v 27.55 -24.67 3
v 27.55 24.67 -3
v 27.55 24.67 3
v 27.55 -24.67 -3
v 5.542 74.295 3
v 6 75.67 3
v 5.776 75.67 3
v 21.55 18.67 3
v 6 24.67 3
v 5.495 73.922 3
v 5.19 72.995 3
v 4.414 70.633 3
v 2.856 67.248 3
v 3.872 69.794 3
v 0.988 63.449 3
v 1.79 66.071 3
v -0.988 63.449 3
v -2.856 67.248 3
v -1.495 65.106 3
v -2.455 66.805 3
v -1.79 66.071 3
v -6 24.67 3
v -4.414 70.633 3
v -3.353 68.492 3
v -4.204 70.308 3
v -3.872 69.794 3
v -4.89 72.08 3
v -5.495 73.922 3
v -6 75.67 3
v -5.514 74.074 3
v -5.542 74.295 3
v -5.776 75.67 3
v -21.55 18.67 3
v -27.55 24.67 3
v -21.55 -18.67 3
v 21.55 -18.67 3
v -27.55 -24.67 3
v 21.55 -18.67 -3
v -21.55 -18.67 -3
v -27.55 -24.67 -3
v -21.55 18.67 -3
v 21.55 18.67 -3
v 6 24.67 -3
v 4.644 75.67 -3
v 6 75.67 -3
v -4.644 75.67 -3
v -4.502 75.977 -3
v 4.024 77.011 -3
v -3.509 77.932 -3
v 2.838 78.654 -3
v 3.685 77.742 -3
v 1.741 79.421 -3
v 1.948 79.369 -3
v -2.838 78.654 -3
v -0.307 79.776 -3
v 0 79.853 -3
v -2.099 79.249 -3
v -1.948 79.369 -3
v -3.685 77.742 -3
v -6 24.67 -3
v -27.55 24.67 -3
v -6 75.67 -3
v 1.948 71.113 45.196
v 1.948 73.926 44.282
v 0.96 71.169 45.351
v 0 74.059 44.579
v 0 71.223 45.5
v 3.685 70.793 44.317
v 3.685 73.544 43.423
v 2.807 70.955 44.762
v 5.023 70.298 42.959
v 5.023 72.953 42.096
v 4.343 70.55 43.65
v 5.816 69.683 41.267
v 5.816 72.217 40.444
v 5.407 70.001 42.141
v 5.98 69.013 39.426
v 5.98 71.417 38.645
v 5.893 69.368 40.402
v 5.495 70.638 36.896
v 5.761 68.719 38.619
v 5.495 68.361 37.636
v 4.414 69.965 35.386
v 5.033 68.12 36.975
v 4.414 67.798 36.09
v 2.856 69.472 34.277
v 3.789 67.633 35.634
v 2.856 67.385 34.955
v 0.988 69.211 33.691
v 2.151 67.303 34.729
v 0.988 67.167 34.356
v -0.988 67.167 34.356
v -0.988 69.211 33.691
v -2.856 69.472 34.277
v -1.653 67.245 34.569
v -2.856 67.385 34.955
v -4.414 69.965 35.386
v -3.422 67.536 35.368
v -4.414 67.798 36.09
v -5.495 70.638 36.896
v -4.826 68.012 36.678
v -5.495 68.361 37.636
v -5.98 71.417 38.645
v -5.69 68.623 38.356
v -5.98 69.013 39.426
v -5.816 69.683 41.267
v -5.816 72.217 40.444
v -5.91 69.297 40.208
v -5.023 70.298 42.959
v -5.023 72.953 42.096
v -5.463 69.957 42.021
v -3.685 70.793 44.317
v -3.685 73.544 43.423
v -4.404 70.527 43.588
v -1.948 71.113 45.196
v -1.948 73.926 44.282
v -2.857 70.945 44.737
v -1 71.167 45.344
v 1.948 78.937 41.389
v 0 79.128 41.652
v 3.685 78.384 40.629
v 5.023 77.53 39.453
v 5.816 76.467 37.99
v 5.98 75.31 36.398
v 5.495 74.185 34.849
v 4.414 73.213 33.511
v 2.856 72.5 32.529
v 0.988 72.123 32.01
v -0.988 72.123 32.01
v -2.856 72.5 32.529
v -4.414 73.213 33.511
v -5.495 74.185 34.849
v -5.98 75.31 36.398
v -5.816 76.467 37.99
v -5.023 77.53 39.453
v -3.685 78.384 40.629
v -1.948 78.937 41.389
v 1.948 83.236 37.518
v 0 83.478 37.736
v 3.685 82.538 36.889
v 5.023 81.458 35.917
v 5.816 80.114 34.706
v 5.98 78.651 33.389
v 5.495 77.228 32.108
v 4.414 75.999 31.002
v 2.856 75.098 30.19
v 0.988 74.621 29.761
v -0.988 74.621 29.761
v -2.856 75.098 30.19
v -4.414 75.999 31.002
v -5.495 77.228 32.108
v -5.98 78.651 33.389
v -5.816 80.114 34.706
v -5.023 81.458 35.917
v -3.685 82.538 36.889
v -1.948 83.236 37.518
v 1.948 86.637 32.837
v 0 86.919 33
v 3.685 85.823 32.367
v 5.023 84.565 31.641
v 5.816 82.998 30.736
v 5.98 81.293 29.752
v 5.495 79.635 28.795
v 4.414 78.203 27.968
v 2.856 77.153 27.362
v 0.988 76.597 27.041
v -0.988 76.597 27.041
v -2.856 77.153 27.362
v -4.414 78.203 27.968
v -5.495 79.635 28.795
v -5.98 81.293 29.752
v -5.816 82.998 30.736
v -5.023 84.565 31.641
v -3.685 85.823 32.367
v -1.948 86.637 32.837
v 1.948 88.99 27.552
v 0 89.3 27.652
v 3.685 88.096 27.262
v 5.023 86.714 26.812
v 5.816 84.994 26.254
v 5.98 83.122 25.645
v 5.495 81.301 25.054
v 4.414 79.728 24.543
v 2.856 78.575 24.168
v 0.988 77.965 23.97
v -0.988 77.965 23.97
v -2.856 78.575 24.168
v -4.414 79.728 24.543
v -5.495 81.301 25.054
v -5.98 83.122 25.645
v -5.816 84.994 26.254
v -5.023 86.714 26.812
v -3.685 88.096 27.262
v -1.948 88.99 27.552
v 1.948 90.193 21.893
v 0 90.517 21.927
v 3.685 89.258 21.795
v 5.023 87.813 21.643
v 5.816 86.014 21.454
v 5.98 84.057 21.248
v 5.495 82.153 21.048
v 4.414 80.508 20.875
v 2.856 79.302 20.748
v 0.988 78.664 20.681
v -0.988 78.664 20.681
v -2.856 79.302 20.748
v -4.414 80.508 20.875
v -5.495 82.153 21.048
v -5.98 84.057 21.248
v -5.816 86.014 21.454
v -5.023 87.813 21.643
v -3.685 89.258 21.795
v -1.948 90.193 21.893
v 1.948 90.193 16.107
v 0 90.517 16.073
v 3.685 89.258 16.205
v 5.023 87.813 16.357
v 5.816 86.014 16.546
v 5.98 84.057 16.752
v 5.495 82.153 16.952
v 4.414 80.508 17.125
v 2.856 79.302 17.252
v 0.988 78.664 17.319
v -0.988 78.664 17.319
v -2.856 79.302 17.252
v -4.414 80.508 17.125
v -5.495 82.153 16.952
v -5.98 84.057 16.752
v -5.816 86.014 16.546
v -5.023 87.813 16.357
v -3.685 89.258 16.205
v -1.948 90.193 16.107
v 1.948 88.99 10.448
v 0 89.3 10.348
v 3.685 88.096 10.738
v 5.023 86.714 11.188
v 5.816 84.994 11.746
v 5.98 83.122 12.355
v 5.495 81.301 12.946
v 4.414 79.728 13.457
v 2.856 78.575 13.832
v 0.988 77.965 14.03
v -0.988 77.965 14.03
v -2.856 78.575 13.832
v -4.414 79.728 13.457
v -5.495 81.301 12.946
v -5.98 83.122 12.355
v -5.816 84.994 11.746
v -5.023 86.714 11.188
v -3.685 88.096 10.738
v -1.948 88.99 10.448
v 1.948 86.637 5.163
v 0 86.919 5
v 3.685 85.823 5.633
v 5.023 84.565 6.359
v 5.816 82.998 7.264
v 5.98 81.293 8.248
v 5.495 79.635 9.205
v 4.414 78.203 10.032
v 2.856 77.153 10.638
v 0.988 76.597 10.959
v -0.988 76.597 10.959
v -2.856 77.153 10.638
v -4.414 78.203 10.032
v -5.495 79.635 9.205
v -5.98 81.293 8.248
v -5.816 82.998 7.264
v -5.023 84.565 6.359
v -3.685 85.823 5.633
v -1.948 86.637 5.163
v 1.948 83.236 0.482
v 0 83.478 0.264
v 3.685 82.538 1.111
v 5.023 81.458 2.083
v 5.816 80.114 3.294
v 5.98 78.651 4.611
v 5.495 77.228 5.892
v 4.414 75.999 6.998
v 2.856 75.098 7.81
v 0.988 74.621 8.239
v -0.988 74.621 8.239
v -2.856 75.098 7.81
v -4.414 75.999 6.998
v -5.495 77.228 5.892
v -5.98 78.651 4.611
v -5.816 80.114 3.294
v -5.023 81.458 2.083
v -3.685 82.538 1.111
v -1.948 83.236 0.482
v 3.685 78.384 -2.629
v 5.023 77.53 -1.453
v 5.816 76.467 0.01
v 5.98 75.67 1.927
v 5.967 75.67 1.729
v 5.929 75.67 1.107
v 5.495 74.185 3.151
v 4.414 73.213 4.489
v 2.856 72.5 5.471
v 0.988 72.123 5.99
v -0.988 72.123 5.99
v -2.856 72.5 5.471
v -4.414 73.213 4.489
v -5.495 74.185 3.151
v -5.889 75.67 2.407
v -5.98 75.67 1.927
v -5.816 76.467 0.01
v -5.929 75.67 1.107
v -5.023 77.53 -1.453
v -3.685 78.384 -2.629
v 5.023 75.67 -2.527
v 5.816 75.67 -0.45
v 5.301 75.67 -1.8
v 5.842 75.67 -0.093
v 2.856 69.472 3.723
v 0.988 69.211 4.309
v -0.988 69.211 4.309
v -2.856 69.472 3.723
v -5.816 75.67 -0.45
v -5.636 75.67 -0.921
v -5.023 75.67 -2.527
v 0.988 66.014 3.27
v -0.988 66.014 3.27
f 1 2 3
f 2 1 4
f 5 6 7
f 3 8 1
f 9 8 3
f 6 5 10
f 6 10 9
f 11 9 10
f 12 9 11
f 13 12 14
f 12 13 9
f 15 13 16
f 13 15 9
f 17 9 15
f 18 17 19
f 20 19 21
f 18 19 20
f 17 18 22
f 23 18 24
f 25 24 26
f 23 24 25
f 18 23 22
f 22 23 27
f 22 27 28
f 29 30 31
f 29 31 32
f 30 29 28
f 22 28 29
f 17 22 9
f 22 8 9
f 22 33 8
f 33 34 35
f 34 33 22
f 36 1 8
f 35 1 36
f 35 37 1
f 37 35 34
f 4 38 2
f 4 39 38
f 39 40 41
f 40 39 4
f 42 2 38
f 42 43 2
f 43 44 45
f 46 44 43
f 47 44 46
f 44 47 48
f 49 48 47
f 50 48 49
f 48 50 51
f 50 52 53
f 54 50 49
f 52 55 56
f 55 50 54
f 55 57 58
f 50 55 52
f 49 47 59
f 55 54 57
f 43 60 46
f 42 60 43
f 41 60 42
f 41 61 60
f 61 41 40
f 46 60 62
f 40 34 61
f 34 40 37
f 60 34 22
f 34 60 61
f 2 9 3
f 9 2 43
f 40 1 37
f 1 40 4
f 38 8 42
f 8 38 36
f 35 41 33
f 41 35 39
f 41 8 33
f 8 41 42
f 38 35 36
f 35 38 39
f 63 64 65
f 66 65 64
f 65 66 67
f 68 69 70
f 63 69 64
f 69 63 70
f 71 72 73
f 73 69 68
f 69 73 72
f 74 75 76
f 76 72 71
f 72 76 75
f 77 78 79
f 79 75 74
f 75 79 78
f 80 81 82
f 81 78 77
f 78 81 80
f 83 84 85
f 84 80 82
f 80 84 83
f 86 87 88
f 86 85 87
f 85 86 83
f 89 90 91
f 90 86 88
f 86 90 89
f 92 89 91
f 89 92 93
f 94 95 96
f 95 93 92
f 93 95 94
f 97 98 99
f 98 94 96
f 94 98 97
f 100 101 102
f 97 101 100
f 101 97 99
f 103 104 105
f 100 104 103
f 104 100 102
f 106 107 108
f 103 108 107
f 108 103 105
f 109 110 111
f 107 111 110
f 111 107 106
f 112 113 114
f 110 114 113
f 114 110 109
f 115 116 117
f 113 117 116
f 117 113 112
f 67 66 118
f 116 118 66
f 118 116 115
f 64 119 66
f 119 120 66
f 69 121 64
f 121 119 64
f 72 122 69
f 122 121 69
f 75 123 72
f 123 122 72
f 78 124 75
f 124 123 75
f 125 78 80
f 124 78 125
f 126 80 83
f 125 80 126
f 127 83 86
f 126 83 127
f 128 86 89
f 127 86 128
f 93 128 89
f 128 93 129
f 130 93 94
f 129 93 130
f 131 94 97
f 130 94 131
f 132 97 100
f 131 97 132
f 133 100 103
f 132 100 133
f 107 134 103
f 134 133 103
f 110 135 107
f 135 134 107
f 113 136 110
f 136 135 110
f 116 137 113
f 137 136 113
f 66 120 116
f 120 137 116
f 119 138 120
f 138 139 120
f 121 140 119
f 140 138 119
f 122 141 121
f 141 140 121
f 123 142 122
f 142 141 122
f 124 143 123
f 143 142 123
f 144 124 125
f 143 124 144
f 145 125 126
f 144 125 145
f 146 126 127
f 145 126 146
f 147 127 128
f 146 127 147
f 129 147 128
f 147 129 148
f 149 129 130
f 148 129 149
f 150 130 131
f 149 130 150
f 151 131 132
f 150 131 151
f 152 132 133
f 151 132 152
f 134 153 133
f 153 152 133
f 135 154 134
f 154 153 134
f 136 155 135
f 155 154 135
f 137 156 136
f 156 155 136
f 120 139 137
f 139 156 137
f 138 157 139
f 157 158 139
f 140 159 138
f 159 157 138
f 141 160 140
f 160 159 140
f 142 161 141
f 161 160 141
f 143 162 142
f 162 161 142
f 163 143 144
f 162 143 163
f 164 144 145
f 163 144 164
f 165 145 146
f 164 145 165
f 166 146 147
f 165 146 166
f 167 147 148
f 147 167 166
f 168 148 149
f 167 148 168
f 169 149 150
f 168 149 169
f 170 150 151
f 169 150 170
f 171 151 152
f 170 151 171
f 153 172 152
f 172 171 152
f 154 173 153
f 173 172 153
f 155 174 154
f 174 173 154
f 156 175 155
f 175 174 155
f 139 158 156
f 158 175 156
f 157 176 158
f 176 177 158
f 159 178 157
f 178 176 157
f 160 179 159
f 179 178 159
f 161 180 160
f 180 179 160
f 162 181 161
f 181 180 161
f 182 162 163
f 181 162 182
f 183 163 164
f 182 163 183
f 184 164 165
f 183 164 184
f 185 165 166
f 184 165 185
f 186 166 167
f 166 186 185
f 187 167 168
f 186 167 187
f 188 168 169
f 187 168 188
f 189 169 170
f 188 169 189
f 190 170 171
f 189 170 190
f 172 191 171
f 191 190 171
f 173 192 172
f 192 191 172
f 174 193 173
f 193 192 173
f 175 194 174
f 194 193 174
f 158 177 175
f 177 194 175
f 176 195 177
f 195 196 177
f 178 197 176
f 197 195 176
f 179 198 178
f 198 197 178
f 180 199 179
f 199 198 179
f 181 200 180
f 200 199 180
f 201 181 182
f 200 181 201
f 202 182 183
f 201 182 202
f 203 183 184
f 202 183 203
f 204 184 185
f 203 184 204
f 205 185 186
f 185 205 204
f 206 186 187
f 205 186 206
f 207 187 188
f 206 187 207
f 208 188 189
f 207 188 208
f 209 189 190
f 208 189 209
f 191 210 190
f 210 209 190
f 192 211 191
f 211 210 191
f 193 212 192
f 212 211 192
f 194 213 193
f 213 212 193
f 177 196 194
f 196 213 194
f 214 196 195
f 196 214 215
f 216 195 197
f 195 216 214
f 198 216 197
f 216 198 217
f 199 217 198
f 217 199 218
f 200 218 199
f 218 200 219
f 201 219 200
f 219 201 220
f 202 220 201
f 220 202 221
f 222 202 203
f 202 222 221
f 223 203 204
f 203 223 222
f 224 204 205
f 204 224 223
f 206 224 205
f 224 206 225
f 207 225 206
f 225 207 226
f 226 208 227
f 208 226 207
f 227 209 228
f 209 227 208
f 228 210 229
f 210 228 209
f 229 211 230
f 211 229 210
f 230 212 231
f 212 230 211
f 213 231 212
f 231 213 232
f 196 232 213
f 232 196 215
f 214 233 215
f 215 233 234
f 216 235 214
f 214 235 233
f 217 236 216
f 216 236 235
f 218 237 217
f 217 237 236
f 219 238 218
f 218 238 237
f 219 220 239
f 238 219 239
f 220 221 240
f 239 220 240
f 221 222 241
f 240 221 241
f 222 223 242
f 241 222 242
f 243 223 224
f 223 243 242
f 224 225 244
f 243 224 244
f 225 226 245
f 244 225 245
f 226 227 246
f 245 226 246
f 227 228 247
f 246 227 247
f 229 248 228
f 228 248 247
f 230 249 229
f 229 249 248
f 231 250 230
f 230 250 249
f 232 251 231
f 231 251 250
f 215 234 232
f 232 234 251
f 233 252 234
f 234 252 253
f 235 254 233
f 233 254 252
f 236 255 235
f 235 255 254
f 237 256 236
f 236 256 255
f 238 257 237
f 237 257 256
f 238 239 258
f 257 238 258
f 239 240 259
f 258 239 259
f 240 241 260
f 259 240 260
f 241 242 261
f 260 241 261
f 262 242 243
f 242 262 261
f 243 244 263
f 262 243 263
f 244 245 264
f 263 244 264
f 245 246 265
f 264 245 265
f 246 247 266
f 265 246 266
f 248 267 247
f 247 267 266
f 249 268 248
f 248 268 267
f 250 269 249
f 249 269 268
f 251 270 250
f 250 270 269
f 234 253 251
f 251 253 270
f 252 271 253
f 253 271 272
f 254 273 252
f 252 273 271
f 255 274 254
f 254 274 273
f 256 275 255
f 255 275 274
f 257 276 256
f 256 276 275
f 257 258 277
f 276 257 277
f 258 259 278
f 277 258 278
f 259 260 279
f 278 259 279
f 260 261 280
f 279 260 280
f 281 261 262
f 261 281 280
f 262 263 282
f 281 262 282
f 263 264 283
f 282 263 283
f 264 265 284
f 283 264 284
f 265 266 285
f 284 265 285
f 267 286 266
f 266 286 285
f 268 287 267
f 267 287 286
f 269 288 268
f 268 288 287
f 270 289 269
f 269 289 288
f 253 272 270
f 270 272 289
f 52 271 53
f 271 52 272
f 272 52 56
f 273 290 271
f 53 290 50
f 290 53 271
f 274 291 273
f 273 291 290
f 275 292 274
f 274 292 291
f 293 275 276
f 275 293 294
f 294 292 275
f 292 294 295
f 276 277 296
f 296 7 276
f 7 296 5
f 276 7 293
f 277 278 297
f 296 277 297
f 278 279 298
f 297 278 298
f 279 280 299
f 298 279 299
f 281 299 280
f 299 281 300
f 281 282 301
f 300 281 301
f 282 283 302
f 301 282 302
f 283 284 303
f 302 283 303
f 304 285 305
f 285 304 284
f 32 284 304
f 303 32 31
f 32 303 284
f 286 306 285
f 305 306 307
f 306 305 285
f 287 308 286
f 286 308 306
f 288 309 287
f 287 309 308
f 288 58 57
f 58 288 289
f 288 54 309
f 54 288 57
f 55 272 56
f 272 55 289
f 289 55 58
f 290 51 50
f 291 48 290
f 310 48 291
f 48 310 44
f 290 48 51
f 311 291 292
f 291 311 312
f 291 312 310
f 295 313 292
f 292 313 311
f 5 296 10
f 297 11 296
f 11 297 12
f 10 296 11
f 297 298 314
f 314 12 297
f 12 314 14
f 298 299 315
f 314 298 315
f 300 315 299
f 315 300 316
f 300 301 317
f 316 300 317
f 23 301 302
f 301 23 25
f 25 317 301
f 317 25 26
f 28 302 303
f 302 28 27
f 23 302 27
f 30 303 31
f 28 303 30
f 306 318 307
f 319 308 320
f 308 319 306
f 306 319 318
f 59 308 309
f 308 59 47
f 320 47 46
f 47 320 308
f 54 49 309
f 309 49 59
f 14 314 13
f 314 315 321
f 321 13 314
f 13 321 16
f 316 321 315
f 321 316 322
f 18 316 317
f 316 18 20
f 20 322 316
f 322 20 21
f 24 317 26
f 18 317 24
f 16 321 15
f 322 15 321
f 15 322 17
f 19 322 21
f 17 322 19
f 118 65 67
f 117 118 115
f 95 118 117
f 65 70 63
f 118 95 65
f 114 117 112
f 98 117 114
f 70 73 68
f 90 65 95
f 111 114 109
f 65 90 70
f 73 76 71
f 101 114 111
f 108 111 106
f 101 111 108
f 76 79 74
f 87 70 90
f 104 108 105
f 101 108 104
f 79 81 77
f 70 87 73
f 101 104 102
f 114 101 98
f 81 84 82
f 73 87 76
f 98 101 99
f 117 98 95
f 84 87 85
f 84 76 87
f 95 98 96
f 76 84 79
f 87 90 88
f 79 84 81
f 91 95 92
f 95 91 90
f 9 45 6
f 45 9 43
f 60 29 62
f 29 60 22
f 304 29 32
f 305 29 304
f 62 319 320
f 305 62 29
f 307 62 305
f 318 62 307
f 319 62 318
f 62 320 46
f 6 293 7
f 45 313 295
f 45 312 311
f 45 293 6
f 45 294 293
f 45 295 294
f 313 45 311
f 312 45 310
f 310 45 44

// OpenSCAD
use <MCAD/regular_shapes.scad>

t = 6;
w = 42.9 + 0.2;
h = 37.14 + 0.2;

frame = [w, h, t];

hook_r = 22;
num_hooks = 1;

hook0_space = hook_r * 2;
hook_step = hook_r * 3;

difference(){
    cube(frame + [2*t, 2*t, 0], center=true);
    cube(frame, center=true);
}

spine_l = hook0_space + hook_step*(num_hooks-1) + 7;
translate([0, spine_l/2+h/2+t, 0])
cube([2*t, spine_l, t], center=true);


theta = 20;
for (i = [0:num_hooks-1]){
    translate([0, h/2+ hook0_space + hook_step*i, 0])
    intersection(){
        translate([0, 0, hook_r-t/2])
        rotate([0, 90, 0])
        torus2(hook_r, t);
        
        rotate([0, -90, 0])
        translate([0, 0, -t])
        linear_extrude(2*t){
            polygon([
                [-t/2, 0],
                [hook_r, 0],
                [cos(theta)*(hook_r + t)*sqrt(2) + hook_r, sin(theta)*(hook_r + t)*sqrt(2)],
                [hook_r, (hook_r + t)*sqrt(2)],
                [-t/2, hook_r+t]
            ]);
        }
    }
}
